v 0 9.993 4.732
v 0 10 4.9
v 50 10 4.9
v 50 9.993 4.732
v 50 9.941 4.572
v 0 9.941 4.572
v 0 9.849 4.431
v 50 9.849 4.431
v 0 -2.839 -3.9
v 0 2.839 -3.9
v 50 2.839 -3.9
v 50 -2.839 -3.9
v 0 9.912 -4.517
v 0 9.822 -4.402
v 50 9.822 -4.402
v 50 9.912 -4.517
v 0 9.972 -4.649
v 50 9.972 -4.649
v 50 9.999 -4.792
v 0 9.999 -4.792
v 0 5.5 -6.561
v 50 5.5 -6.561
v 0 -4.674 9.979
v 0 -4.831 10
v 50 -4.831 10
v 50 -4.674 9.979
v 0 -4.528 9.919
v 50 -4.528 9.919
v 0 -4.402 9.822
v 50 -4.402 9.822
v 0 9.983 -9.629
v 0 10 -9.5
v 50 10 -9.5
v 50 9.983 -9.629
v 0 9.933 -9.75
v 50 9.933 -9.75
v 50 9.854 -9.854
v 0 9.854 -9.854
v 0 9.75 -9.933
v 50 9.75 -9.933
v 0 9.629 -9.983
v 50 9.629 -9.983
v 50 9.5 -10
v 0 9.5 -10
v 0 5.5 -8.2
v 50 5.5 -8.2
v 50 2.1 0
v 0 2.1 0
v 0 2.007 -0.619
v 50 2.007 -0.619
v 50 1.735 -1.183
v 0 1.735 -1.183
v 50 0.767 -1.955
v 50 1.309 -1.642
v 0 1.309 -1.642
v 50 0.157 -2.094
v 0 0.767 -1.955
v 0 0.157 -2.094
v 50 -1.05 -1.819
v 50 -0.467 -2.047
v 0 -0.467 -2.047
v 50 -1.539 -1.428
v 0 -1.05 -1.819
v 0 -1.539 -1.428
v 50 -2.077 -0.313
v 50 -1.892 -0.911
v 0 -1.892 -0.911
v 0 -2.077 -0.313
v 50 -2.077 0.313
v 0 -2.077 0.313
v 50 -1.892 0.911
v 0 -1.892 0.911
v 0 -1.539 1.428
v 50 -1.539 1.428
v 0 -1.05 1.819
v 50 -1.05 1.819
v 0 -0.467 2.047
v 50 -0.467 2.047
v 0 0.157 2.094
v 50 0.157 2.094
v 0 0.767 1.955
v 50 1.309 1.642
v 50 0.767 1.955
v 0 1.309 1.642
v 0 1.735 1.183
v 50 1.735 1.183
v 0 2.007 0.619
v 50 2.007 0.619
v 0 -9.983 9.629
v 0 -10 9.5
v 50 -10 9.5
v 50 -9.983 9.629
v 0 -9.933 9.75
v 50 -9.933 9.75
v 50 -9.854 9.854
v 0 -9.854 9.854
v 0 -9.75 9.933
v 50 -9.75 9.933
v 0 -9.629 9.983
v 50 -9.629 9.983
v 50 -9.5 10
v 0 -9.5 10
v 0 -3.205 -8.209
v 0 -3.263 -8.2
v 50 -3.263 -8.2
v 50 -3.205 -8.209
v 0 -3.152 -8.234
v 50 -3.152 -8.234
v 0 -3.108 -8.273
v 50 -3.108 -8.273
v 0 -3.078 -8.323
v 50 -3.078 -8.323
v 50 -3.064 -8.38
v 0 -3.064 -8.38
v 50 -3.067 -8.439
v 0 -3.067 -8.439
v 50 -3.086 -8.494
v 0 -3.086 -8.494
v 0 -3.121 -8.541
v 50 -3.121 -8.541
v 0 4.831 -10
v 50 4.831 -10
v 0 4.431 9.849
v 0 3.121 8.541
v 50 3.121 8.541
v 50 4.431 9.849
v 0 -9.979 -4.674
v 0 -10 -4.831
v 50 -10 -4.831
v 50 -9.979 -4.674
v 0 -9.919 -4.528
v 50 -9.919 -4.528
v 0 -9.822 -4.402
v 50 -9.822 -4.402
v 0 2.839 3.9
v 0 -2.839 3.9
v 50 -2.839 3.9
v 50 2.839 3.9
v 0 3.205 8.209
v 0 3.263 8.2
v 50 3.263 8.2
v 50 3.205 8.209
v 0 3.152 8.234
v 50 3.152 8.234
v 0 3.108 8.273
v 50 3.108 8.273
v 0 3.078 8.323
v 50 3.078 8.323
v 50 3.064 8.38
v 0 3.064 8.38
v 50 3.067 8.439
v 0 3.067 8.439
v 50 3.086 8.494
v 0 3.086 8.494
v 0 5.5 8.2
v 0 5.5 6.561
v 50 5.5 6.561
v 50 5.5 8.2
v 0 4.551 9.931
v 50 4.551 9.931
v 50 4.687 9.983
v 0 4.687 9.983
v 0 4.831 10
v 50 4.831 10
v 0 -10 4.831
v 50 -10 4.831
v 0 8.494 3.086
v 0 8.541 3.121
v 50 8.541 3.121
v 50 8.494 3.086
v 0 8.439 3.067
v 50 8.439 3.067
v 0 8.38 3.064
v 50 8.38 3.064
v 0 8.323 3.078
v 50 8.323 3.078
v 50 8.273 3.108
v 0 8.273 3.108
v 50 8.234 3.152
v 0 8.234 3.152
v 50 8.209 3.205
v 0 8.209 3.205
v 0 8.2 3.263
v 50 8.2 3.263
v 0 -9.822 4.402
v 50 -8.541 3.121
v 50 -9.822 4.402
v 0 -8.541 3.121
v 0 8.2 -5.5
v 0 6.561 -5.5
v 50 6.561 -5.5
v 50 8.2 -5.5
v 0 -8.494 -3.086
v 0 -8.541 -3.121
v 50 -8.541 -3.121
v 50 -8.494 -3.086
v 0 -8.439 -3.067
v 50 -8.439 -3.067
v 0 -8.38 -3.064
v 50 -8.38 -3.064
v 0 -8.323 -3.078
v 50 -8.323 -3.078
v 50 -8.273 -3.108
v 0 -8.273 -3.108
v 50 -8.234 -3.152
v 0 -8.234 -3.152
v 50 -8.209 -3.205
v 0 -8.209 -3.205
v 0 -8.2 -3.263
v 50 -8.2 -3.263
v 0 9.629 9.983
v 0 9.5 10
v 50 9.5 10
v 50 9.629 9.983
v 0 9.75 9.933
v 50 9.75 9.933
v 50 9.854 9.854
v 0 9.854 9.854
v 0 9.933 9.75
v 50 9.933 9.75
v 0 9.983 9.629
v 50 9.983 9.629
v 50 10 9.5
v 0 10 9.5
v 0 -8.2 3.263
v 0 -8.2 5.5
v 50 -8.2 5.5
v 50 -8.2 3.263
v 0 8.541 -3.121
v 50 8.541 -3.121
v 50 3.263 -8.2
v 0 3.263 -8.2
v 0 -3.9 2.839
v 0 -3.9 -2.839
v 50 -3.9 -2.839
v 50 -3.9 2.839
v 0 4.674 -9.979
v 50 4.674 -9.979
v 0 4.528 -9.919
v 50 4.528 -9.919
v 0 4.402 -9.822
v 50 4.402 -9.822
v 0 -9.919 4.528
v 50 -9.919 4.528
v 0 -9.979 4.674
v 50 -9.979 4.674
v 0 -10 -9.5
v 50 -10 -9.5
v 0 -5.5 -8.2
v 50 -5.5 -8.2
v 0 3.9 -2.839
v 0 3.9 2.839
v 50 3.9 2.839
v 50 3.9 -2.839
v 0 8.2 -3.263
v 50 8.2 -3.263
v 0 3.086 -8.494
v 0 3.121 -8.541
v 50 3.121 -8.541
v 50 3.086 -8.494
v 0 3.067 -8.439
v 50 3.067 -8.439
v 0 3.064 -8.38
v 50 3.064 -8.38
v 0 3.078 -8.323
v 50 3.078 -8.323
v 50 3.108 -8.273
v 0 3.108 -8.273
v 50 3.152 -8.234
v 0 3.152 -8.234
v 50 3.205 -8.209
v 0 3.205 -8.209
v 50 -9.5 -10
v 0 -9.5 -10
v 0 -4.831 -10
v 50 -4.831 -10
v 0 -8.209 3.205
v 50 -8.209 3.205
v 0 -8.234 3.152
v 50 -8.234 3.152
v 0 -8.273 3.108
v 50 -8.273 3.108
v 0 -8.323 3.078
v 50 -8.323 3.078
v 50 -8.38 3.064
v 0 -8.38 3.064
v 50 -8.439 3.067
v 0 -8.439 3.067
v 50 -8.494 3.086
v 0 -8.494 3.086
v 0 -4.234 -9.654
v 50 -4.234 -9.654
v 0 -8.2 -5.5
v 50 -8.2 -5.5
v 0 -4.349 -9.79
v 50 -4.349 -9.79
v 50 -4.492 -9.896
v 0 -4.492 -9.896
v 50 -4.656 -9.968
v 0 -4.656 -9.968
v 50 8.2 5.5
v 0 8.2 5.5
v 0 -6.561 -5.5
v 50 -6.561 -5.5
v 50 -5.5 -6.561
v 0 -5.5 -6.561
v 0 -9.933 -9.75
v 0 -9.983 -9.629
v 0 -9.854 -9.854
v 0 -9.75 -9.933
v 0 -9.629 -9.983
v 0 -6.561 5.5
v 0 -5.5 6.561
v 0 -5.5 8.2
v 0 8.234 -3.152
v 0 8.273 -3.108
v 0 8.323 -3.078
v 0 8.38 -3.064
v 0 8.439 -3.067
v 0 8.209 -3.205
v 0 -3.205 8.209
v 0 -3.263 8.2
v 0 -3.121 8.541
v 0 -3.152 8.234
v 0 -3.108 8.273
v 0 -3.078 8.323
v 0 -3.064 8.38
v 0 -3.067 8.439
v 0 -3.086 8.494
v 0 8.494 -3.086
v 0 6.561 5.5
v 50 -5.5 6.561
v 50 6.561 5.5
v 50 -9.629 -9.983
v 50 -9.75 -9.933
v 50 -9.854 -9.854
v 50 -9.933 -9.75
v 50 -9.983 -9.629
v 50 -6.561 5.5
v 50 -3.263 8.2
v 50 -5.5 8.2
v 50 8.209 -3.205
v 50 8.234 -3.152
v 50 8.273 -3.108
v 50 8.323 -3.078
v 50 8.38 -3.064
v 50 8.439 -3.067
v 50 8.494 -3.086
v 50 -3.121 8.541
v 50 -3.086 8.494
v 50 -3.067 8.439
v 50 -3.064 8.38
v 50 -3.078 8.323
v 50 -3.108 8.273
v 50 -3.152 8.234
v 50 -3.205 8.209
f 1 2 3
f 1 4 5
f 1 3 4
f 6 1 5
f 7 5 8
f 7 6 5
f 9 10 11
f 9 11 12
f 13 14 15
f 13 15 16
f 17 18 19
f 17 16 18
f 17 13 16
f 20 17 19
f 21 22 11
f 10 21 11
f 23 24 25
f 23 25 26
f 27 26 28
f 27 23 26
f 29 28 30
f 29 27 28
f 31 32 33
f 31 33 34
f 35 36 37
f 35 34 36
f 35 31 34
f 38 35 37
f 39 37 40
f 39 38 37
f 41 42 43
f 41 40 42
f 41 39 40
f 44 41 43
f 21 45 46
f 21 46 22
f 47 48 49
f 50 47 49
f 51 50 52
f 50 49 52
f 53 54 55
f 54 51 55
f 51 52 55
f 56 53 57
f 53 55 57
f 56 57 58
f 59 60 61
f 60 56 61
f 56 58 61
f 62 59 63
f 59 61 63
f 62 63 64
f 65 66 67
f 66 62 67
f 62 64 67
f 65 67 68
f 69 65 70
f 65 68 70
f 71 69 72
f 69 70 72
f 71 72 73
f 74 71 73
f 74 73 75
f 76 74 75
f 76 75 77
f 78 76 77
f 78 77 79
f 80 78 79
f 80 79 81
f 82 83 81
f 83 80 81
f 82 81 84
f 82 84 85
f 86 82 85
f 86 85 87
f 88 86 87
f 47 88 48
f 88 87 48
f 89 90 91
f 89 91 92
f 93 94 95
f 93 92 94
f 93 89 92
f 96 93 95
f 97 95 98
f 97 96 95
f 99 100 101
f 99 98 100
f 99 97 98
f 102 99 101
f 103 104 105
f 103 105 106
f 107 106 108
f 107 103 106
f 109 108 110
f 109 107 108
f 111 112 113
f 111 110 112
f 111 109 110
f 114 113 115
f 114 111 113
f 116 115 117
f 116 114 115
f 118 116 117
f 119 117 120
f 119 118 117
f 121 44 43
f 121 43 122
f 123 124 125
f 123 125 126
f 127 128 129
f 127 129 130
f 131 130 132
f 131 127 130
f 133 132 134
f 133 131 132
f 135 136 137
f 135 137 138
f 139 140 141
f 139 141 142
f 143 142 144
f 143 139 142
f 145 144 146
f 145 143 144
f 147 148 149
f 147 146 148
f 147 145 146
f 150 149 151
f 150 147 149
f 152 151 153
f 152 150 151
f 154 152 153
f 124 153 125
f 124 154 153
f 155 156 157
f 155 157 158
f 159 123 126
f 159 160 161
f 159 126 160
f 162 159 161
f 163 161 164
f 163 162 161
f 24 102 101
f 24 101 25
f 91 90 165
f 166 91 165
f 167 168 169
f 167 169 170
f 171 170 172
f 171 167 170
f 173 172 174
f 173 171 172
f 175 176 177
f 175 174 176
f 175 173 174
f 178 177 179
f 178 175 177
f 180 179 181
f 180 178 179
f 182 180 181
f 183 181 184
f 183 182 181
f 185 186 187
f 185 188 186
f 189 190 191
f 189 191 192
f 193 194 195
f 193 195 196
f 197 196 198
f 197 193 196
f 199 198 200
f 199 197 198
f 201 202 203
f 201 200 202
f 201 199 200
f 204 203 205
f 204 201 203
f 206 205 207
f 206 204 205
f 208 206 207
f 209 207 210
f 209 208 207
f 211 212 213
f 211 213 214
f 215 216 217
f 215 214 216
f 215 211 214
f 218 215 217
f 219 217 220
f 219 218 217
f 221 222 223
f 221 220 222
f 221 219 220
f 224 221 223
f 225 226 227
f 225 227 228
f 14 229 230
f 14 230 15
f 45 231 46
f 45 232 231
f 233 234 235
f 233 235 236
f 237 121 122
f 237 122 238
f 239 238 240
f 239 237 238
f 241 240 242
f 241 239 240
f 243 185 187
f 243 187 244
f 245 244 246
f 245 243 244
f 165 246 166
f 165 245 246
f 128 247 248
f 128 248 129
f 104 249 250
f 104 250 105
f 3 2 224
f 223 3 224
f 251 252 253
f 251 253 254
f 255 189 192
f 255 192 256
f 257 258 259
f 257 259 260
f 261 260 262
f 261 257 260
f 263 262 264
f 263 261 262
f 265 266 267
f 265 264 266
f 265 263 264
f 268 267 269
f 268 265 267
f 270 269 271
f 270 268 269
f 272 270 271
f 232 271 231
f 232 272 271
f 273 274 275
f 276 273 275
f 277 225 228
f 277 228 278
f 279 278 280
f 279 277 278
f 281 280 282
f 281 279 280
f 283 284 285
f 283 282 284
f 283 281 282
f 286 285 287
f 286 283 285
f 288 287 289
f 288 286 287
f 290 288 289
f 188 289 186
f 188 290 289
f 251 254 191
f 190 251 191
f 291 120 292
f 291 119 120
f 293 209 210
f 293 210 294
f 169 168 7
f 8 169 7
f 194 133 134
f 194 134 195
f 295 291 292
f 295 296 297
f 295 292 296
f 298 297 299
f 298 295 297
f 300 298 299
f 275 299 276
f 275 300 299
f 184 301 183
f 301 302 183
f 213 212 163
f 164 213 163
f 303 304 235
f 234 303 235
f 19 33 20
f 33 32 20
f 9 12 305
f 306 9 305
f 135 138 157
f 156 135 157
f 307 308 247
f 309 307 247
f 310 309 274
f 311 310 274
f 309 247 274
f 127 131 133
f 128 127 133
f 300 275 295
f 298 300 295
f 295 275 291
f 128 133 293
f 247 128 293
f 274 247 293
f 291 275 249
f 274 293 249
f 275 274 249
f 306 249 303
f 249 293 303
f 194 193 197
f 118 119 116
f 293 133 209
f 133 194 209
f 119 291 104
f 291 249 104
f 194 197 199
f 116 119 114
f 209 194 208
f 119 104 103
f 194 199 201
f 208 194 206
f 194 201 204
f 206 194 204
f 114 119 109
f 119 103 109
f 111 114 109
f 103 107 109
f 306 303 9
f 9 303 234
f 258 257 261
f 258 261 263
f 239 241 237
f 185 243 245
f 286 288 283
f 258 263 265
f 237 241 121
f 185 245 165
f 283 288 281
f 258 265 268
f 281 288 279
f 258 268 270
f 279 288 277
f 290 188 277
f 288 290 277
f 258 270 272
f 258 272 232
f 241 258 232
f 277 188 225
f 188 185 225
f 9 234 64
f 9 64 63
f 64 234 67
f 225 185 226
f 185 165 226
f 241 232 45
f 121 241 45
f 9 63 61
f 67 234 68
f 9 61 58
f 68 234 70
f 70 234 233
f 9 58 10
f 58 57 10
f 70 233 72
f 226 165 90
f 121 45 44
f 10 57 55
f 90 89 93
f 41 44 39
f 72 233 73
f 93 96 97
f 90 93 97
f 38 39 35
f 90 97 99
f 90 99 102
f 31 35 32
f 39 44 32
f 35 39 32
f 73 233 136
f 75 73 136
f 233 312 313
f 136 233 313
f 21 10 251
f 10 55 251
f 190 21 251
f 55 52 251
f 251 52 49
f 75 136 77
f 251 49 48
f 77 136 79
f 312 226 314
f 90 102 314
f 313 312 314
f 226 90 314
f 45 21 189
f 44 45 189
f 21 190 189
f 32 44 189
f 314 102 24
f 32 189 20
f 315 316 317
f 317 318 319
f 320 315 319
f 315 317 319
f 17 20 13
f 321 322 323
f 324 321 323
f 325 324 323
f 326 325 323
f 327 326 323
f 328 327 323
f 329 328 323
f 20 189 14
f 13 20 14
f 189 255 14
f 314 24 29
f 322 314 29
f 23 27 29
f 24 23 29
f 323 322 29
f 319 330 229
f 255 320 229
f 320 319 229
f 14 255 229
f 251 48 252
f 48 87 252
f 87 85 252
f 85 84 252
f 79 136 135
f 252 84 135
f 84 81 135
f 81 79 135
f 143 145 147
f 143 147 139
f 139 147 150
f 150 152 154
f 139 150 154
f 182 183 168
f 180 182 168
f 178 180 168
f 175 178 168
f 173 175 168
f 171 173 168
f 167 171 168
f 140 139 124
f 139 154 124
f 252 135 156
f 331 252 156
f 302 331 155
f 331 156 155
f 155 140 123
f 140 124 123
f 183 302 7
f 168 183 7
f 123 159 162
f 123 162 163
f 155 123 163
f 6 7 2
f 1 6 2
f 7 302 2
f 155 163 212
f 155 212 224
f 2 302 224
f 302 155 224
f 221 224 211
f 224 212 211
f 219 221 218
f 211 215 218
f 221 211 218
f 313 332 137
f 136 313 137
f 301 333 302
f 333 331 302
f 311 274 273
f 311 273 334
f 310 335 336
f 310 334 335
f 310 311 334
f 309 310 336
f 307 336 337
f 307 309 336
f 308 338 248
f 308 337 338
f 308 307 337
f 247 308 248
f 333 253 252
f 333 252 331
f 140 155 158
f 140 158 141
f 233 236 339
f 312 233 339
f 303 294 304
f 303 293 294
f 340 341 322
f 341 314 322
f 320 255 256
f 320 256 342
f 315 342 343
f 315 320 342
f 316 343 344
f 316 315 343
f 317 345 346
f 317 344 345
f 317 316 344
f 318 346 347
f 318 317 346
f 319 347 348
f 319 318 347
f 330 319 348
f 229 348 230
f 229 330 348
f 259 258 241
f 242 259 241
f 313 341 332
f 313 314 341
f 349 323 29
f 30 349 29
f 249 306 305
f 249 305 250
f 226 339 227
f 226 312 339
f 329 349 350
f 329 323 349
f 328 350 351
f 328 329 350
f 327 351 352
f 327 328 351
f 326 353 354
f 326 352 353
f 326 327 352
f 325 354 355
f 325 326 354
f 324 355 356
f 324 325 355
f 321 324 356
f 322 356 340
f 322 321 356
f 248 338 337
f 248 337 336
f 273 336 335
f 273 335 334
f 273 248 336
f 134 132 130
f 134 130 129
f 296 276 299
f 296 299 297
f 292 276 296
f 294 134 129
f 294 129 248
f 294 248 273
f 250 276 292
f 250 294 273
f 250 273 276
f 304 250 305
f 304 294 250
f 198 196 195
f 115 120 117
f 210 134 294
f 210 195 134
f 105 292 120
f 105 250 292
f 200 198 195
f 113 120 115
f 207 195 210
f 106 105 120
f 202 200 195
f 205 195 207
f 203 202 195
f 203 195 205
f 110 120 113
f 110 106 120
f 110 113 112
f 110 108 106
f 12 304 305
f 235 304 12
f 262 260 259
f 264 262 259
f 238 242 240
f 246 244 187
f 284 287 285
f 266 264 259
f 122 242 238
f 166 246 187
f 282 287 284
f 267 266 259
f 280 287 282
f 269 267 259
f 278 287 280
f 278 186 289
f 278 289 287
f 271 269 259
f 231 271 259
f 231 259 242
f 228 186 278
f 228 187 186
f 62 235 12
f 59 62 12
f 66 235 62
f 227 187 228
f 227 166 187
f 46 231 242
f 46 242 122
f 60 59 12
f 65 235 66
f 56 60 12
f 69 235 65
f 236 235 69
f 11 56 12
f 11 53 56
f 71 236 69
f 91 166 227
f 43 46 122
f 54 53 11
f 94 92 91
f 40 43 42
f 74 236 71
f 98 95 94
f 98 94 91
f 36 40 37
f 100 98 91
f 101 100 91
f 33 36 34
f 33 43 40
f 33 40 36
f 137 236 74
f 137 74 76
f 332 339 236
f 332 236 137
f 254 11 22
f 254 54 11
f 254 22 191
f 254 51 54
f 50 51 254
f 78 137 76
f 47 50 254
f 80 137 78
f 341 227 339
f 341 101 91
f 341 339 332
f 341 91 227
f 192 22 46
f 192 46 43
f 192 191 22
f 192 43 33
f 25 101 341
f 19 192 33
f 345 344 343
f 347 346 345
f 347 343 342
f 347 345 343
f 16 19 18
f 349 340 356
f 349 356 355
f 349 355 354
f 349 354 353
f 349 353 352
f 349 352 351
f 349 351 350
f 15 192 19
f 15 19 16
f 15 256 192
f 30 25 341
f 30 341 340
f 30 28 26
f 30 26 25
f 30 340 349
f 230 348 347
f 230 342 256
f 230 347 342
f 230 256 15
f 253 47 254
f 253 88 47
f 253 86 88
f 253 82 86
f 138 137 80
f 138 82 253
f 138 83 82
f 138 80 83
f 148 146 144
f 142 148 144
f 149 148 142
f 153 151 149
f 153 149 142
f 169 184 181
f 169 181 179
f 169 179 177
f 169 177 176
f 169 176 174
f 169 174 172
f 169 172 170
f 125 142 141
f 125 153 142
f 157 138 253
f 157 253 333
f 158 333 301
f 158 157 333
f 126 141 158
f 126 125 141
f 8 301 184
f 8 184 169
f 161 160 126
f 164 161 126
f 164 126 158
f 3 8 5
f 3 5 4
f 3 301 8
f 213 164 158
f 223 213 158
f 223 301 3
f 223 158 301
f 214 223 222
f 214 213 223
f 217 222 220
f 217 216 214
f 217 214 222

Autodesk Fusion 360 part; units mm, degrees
sketch "Sketch1" plane through (0, 0, 0) normal (1, 0, 0) x (0, 1, 0)
  line L0 (4.6363, -9.9678) -> (4.6743, -9.9793) construction
  line L1 (-9.9374, 4.563) -> (-9.9187, 4.5279) construction
  line L2 (8.5, -10) -> (9.5, -10) construction
  line L3 (10, -9.5) -> (10, -8.5) construction
  line L4 (-9.8746, 4.4619) -> (-9.8494, 4.4312) construction
  line L5 (-9.9187, 4.5279) -> (-9.8977, 4.4942) construction
  line L6 (9.9987, -4.7917) -> (9.9948, -4.7522) construction
  line L7 (9.8977, -4.4942) -> (9.8746, -4.4619) construction
  arc A0 (-8.5414, 3.1214) -> (-8.2, 3.2628) centre (-8.4, 3.2628) ccw construction
  line L8 (10, -4.9) -> (9.9987, -4.7917) construction
  line L9 (-3.9, 2.8393) -> (-3.9, 0.1999) construction
  line L10 (-9.8977, 4.4942) -> (-9.8746, 4.4619) construction
  line L11 (-10, 4.8314) -> (-9.9987, 4.7917) construction
  line L12 (-9.8494, 4.4312) -> (-9.8222, 4.4022) construction
  line L13 (8.2, -5.5) -> (6.5607, -5.5) construction
  line L14 (-6.5607, 5.5) -> (-3.9, 2.8393) construction
  line L15 (5.5, -6.5607) -> (5.5, -8.2) construction
  line L16 (-3.9, 0.1999) -> (-3.7001, 0) construction
  line L17 (6.5607, -5.5) -> (3.9, -2.8393) construction
  line L18 (9.9987, 4.7917) -> (10, 4.9) construction
  line L19 (8.2, -3.2628) -> (8.2, -5.5) construction
  line L20 (-4.4942, 9.8977) -> (-4.5279, 9.9187) construction
  line L21 (9.9948, 4.7522) -> (9.9987, 4.7917) construction
  line L22 (9.8746, -4.4619) -> (9.8494, -4.4312) construction
  line L23 (9.9374, -4.563) -> (9.9187, -4.5279) construction
  line L24 (10, 8.5) -> (10, 9.5) construction
  line L25 (4.4312, -9.8494) -> (4.4619, -9.8746) construction
  line L26 (-8.2, 3.2628) -> (-8.2, 5.5) construction
  line L27 (4.4619, -9.8746) -> (4.4942, -9.8977) construction
  line L28 (-9.9883, 4.713) -> (-9.9793, 4.6743) construction
  line L29 (9.9883, 4.713) -> (9.9948, 4.7522) construction
  line L30 (-4.4312, 9.8494) -> (-4.4619, 9.8746) construction
  line L31 (10, 4.9) -> (10, 8.5) construction
  arc A1 (9.5, -10) -> (10, -9.5) centre (9.5, -9.5) ccw construction
  line L32 (9.9678, -4.6363) -> (9.9538, -4.5991) construction
  arc A2 (10, 9.5) -> (9.5, 10) centre (9.5, 9.5) ccw construction
  line L33 (4.5991, -9.9538) -> (4.6363, -9.9678) construction
  line L34 (-9.9538, 4.5991) -> (-9.9374, 4.563) construction
  line L35 (-9.9793, 4.6743) -> (-9.9678, 4.6363) construction
  line L36 (4.563, -9.9374) -> (4.5991, -9.9538) construction
  line L37 (1.1358, -3.9) -> (1.1358, -10) construction
  line L38 (-0.2048, -3.9) -> (0, -3.6952) construction
  line L39 (8.5414, 3.1214) -> (9.8222, 4.4022) construction
  line L40 (2.8393, 3.9) -> (0.207, 3.9) construction
  line L41 (0.207, 3.9) -> (0, 3.6952) construction
  line L42 (3.9, -0.1999) -> (3.7001, 0) construction
  line L43 (3.9, -2.8393) -> (3.9, -0.1999) construction
  line L44 (-3.9, -0.1999) -> (-3.9, -2.8393) construction
  line L45 (3.9, 0.1999) -> (3.9, 2.8393) construction
  line L46 (2.8393, 3.9) -> (0.207, 3.9) construction
  line L47 (0, 3.6952) -> (-0.2048, 3.9) construction
  line L48 (3.9, 2.8393) -> (6.5607, 5.5) construction
  line L49 (3.7001, 0) -> (3.9, 0.1999) construction
  line L50 (3.9, 0.1999) -> (3.9, 2.8393) construction
  arc A3 (-3.1214, -8.5414) -> (-3.2628, -8.2) centre (-3.2628, -8.4) ccw construction
  line L51 (0, -3.6952) -> (0.2048, -3.9) construction
  line L52 (-2.8393, -3.9) -> (-0.2048, -3.9) construction
  line L53 (3.9, -0.1999) -> (3.7001, 0) construction
  circle A4 centre (0, 0) radius 2.1 construction
  line L54 (3.7001, 0) -> (3.9, 0.1999) construction
  arc A5 (8.2, 3.2628) -> (8.5414, 3.1214) centre (8.4, 3.2628) ccw construction
  circle A6 centre (0, 0) radius 2.1 construction
  line L55 (5.5, 8.2) -> (5.5, 6.5607) construction
  line L56 (-4.6363, -9.9678) -> (-4.5991, -9.9538) construction
  line L57 (9.9883, 4.713) -> (9.9948, 4.7522) construction
  line L58 (3.2628, 8.2) -> (5.5, 8.2) construction
  line L59 (9.9538, 4.5991) -> (9.9678, 4.6363) construction
  arc A7 (8.2, 3.2628) -> (8.5414, 3.1214) centre (8.4, 3.2628) ccw construction
  line L60 (4.5991, 9.9538) -> (4.563, 9.9374) construction
  line L61 (-9.9538, -4.5991) -> (-9.9678, -4.6363) construction
  line L62 (-9.8977, -4.4942) -> (-9.9187, -4.5279) construction
  line L63 (-4.5279, -9.9187) -> (-4.4942, -9.8977) construction
  line L64 (0, 3.6952) -> (-0.2048, 3.9) construction
  arc A8 (3.1214, 8.5414) -> (3.2628, 8.2) centre (3.2628, 8.4) ccw construction
  line L65 (-9.8494, -4.4312) -> (-9.8746, -4.4619) construction
  line L66 (4.4942, 9.8977) -> (4.4619, 9.8746) construction
  line L67 (4.713, 9.9883) -> (4.6743, 9.9793) construction
  line L68 (-8.5, -10) -> (-4.8314, -10) construction
  line L69 (-9.5, -10) -> (-8.5, -10) construction
  line L70 (9.8222, 4.4022) -> (9.8494, 4.4312) construction
  line L71 (4.8314, 10) -> (4.7917, 9.9987) construction
  line L72 (-9.9948, -4.7522) -> (-9.9987, -4.7917) construction
  line L73 (4.6743, 9.9793) -> (4.6363, 9.9678) construction
  line L74 (5.5, 6.5607) -> (2.8393, 3.9) construction
  line L75 (4.4022, 9.8222) -> (3.1214, 8.5414) construction
  line L76 (-4.5991, -9.9538) -> (-4.563, -9.9374) construction
  line L77 (9.5, 10) -> (4.8314, 10) construction
  line L78 (0.207, 3.9) -> (0, 3.6952) construction
  line L79 (4.6363, 9.9678) -> (4.5991, 9.9538) construction
  line L80 (-9.9883, -4.713) -> (-9.9948, -4.7522) construction
  line L81 (4.7522, 9.9948) -> (4.713, 9.9883) construction
  line L82 (-4.4312, -9.8494) -> (-4.4022, -9.8222) construction
  line L83 (9.8746, 4.4619) -> (9.8977, 4.4942) construction
  line L84 (-8.2, -5.5) -> (-8.2, -3.2628) construction
  line L85 (10, 8.5) -> (10, 9.5) construction
  line L86 (3.2628, 8.2) -> (5.5, 8.2) construction
  arc A9 (3.1214, 8.5414) -> (3.2628, 8.2) centre (3.2628, 8.4) ccw construction
  arc A10 (10, 9.5) -> (9.5, 10) centre (9.5, 9.5) ccw construction
  line L87 (4.4619, 9.8746) -> (4.4312, 9.8494) construction
  line L88 (4.5279, 9.9187) -> (4.4942, 9.8977) construction
  line L89 (-4.6743, -9.9793) -> (-4.6363, -9.9678) construction
  line L90 (-4.7917, -9.9987) -> (-4.7522, -9.9948) construction
  line L91 (-9.9678, -4.6363) -> (-9.9793, -4.6743) construction
  line L92 (9.9793, 4.6743) -> (9.9883, 4.713) construction
  line L93 (-4.8314, -10) -> (-4.7917, -9.9987) construction
  line L94 (-9.9987, -4.7917) -> (-10, -4.8314) construction
  line L95 (5.5, 8.2) -> (5.5, 6.5607) construction
  line L96 (9.8977, 4.4942) -> (9.9187, 4.5279) construction
  arc A11 (-8.2, -3.2628) -> (-8.5414, -3.1214) centre (-8.4, -3.2628) ccw construction
  line L97 (-8.5414, -3.1214) -> (-9.8222, -4.4022) construction
  line L98 (4.563, 9.9374) -> (4.5279, 9.9187) construction
  line L99 (9.9374, 4.563) -> (9.9538, 4.5991) construction
  line L100 (9.8494, 4.4312) -> (9.8746, 4.4619) construction
  line L101 (-4.4942, -9.8977) -> (-4.4619, -9.8746) construction
  line L102 (-9.9187, -4.5279) -> (-9.9374, -4.563) construction
  arc A12 (-10, -9.5) -> (-9.5, -10) centre (-9.5, -9.5) ccw construction
  line L103 (-4.563, -9.9374) -> (-4.5279, -9.9187) construction
  line L104 (4.4022, 9.8222) -> (3.1214, 8.5414) construction
  line L105 (-6.5607, -5.5) -> (-8.2, -5.5) construction
  line L106 (10, 4.9) -> (10, 8.5) construction
  line L107 (3.9, 2.8393) -> (6.5607, 5.5) construction
  line L108 (4.4312, 9.8494) -> (4.4022, 9.8222) construction
  line L109 (9.9678, 4.6363) -> (9.9793, 4.6743) construction
  line L110 (-4.4619, -9.8746) -> (-4.4312, -9.8494) construction
  line L111 (-4.7522, -9.9948) -> (-4.713, -9.9883) construction
  line L112 (-10, -4.8314) -> (-10, -9.5) construction
  line L113 (4.5279, 9.9187) -> (4.4942, 9.8977) construction
  line L114 (9.9948, 4.7522) -> (9.9987, 4.7917) construction
  line L115 (4.7917, 9.9987) -> (4.7522, 9.9948) construction
  line L116 (4.563, 9.9374) -> (4.5279, 9.9187) construction
  line L117 (5.5, 6.5607) -> (2.8393, 3.9) construction
  line L118 (4.4619, 9.8746) -> (4.4312, 9.8494) construction
  line L119 (4.4942, 9.8977) -> (4.4619, 9.8746) construction
  line L120 (4.5991, 9.9538) -> (4.563, 9.9374) construction
  line L121 (-5.5, -8.2) -> (-5.5, -6.5607) construction
  line L122 (9.9987, 4.7917) -> (10, 4.9) construction
  line L123 (8.2, 5.5) -> (8.2, 3.2628) construction
  line L124 (4.4312, 9.8494) -> (4.4022, 9.8222) construction
  line L125 (-9.8746, -4.4619) -> (-9.8977, -4.4942) construction
  line L126 (-4.713, -9.9883) -> (-4.6743, -9.9793) construction
  line L127 (9.9187, 4.5279) -> (9.9374, 4.563) construction
  line L128 (6.5607, 5.5) -> (8.2, 5.5) construction
  line L129 (-9.9793, -4.6743) -> (-9.9883, -4.713) construction
  line L130 (-5.5, -6.5607) -> (-2.8393, -3.9) construction
  line L131 (8.5414, 3.1214) -> (9.8222, 4.4022) construction
  line L132 (-3.9, -2.8393) -> (-6.5607, -5.5) construction
  line L133 (4.713, 9.9883) -> (4.6743, 9.9793) construction
  line L134 (4.7917, 9.9987) -> (4.7522, 9.9948) construction
  line L135 (-4.4022, -9.8222) -> (-3.1214, -8.5414) construction
  line L136 (-9.9987, 4.7917) -> (-9.9948, 4.7522) construction
  line L137 (4.6363, 9.9678) -> (4.5991, 9.9538) construction
  line L138 (4.8314, 10) -> (4.7917, 9.9987) construction
  line L139 (-9.9948, 4.7522) -> (-9.9883, 4.713) construction
  line L140 (4.6743, 9.9793) -> (4.6363, 9.9678) construction
  line L141 (-8.2, 5.5) -> (-6.5607, 5.5) construction
  line L142 (-3.7001, 0) -> (-3.9, -0.1999) construction
  line L143 (-9.9678, 4.6363) -> (-9.9538, 4.5991) construction
  line L144 (-9.8222, 4.4022) -> (-8.5414, 3.1214) construction
  line L145 (-9.9374, -4.563) -> (-9.9538, -4.5991) construction
  line L146 (-9.8222, -4.4022) -> (-9.8494, -4.4312) construction
  line L147 (4.7522, 9.9948) -> (4.713, 9.9883) construction
  line L148 (-3.2628, -8.2) -> (-5.5, -8.2) construction
  line L149 (4.4619, -9.8746) -> (4.4942, -9.8977) construction
  line L150 (-9.9948, 4.7522) -> (-9.9883, 4.713) construction
  line L151 (4.5279, -9.9187) -> (4.563, -9.9374) construction
  line L152 (-9.9793, 4.6743) -> (-9.9678, 4.6363) construction
  line L153 (-9.9883, 4.713) -> (-9.9793, 4.6743) construction
  line L154 (4.4312, -9.8494) -> (4.4619, -9.8746) construction
  line L155 (-9.8977, 4.4942) -> (-9.8746, 4.4619) construction
  line L156 (4.7522, -9.9948) -> (4.7917, -9.9987) construction
  line L157 (4.713, -9.9883) -> (4.7522, -9.9948) construction
  line L158 (4.4942, -9.8977) -> (4.5279, -9.9187) construction
  line L159 (4.5991, -9.9538) -> (4.6363, -9.9678) construction
  line L160 (-9.9187, 4.5279) -> (-9.8977, 4.4942) construction
  line L161 (4.6743, -9.9793) -> (4.713, -9.9883) construction
  line L162 (4.563, -9.9374) -> (4.5991, -9.9538) construction
  line L163 (-9.9678, 4.6363) -> (-9.9538, 4.5991) construction
  line L164 (-9.9538, 4.5991) -> (-9.9374, 4.563) construction
  line L165 (-9.9374, 4.563) -> (-9.9187, 4.5279) construction
  line L166 (-9.8746, 4.4619) -> (-9.8494, 4.4312) construction
  line L167 (4.6363, -9.9678) -> (4.6743, -9.9793) construction
  line L168 (-4.7522, 9.9948) -> (-4.7917, 9.9987) construction
  line L169 (9.8494, 4.4312) -> (9.8746, 4.4619) construction
  line L170 (4.5279, -9.9187) -> (4.563, -9.9374) construction
  line L171 (-4.5991, 9.9538) -> (-4.6363, 9.9678) construction
  line L172 (9.9538, -4.5991) -> (9.9374, -4.563) construction
  line L173 (-10, 9.5) -> (-10, 8.5) construction
  line L174 (9.8977, 4.4942) -> (9.9187, 4.5279) construction
  line L175 (4.8314, -10) -> (8.5, -10) construction
  line L176 (9.8746, 4.4619) -> (9.8977, 4.4942) construction
  line L177 (4.7917, -9.9987) -> (4.8314, -10) construction
  line L178 (-5.5, 8.2) -> (-3.2628, 8.2) construction
  line L179 (9.9793, 4.6743) -> (9.9883, 4.713) construction
  line L180 (4.713, -9.9883) -> (4.7522, -9.9948) construction
  arc A13 (-9.5, 10) -> (-10, 9.5) centre (-9.5, 9.5) ccw construction
  line L181 (2.8393, -3.9) -> (5.5, -6.5607) construction
  line L182 (9.8494, -4.4312) -> (9.8222, -4.4022) construction
  line L183 (9.9187, -4.5279) -> (9.8977, -4.4942) construction
  line L184 (10, -8.5) -> (10, -4.9) construction
  line L185 (-4.563, 9.9374) -> (-4.5991, 9.9538) construction
  line L186 (-4.6743, 9.9793) -> (-4.713, 9.9883) construction
  line L187 (-5.5, 6.5607) -> (-5.5, 8.2) construction
  line L188 (-4.8314, 10) -> (-8.5, 10) construction
  line L189 (9.9374, 4.563) -> (9.9538, 4.5991) construction
  line L190 (-8.5, 10) -> (-9.5, 10) construction
  line L191 (-4.7917, 9.9987) -> (-4.8314, 10) construction
  line L192 (-4.5279, 9.9187) -> (-4.563, 9.9374) construction
  line L193 (9.9538, 4.5991) -> (9.9678, 4.6363) construction
  line L194 (-4.6363, 9.9678) -> (-4.6743, 9.9793) construction
  line L195 (4.7522, -9.9948) -> (4.7917, -9.9987) construction
  line L196 (-3.1214, 8.5414) -> (-4.4022, 9.8222) construction
  line L197 (5.5, -8.2) -> (3.2628, -8.2) construction
  line L198 (9.9793, -4.6743) -> (9.9678, -4.6363) construction
  line L199 (4.6743, -9.9793) -> (4.713, -9.9883) construction
  line L200 (9.9187, 4.5279) -> (9.9374, 4.563) construction
  line L201 (9.9948, -4.7522) -> (9.9883, -4.713) construction
  line L202 (9.8222, -4.4022) -> (8.5414, -3.1214) construction
  line L203 (-4.713, 9.9883) -> (-4.7522, 9.9948) construction
  line L204 (9.9678, 4.6363) -> (9.9793, 4.6743) construction
  line L205 (9.9883, -4.713) -> (9.9793, -4.6743) construction
  arc A14 (-3.2628, 8.2) -> (-3.1214, 8.5414) centre (-3.2628, 8.4) ccw construction
  line L206 (4.4022, -9.8222) -> (4.4312, -9.8494) construction
  arc A15 (8.5414, -3.1214) -> (8.2, -3.2628) centre (8.4, -3.2628) ccw construction
  arc A16 (3.2628, -8.2) -> (3.1214, -8.5414) centre (3.2628, -8.4) ccw construction
  line L207 (9.8222, 4.4022) -> (9.8494, 4.4312) construction
  line L208 (-3.9, 0.1999) -> (-3.7001, 0) construction
  line L209 (-0.2048, 3.9) -> (-2.8393, 3.9) construction
  line L210 (8.2, 5.5) -> (8.2, 3.2628) construction
  line L211 (6.6657, -10) -> (-6.6657, -10) construction
  line L212 (-3.7001, 0) -> (-3.9, -0.1999) construction
  line L213 (4.4942, -9.8977) -> (4.5279, -9.9187) construction
  line L214 (0.2048, -3.9) -> (2.8393, -3.9) construction
  line L215 (-10, 8.5) -> (-10, 4.8314) construction
  line L216 (2.8393, -3.9) -> (5.5, -6.5607) construction
  line L217 (-2.8393, 3.9) -> (-5.5, 6.5607) construction
  line L218 (-0.2048, -3.9) -> (0, -3.6952) construction
  line L219 (5.5, -6.5607) -> (5.5, -8.2) construction
  line L220 (3.9, -2.8393) -> (3.9, -0.1999) construction
  line L221 (-4.4022, 9.8222) -> (-4.4312, 9.8494) construction
  line L222 (-0.2048, 3.9) -> (-2.8393, 3.9) construction
  line L223 (-4.4619, 9.8746) -> (-4.4942, 9.8977) construction
  line L224 (0.2048, -3.9) -> (2.8393, -3.9) construction
  line L225 (3.1214, -8.5414) -> (4.4022, -9.8222) construction
  line L226 (9.5, 10) -> (4.8314, 10) construction
  line L227 (0, -3.6952) -> (0.2048, -3.9) construction
  line L228 (6.5607, 5.5) -> (8.2, 5.5) construction
  line L229 (-2.8393, 3.9) -> (-5.5, 6.5607) construction
  line L230 (-3.9, 2.8393) -> (-3.9, 0.1999) construction
  line L231 (-6.5607, 5.5) -> (-3.9, 2.8393) construction
  arc A17 (-8.5414, 3.1214) -> (-8.2, 3.2628) centre (-8.4, 3.2628) ccw construction
  arc A18 (3.2628, -8.2) -> (3.1214, -8.5414) centre (3.2628, -8.4) ccw construction
  line L232 (-9.8222, 4.4022) -> (-8.5414, 3.1214) construction
  line L233 (-9.8494, 4.4312) -> (-9.8222, 4.4022) construction
  line L234 (-8.2, 5.5) -> (-6.5607, 5.5) construction
  line L235 (4.7917, -9.9987) -> (4.8314, -10) construction
  line L236 (8.5, -10) -> (9.5, -10) construction
  line L237 (4.8314, -10) -> (8.5, -10) construction
  line L238 (-9.5, -10) -> (-8.5, -10) construction
  line L239 (-5.5, -8.2) -> (-5.5, -6.5607) construction
  line L240 (-4.4619, -9.8746) -> (-4.4312, -9.8494) construction
  line L241 (-4.6363, -9.9678) -> (-4.5991, -9.9538) construction
  line L242 (-4.563, -9.9374) -> (-4.5279, -9.9187) construction
  line L243 (-4.7522, -9.9948) -> (-4.713, -9.9883) construction
  line L244 (-8.2, -5.5) -> (-8.2, -3.2628) construction
  arc A19 (-10, -9.5) -> (-9.5, -10) centre (-9.5, -9.5) ccw construction
  line L245 (-4.6743, -9.9793) -> (-4.6363, -9.9678) construction
  line L246 (-4.713, -9.9883) -> (-4.6743, -9.9793) construction
  line L247 (-4.5279, -9.9187) -> (-4.4942, -9.8977) construction
  line L248 (-4.5991, -9.9538) -> (-4.563, -9.9374) construction
  line L249 (-5.5, 8.2) -> (-3.2628, 8.2) construction
  line L250 (6.5607, -5.5) -> (3.9, -2.8393) construction
  line L251 (-3.2628, -8.2) -> (-5.5, -8.2) construction
  line L252 (-4.8314, -10) -> (-4.7917, -9.9987) construction
  line L253 (-4.8314, 10) -> (-8.5, 10) construction
  line L254 (8.2, -3.2628) -> (8.2, -5.5) construction
  line L255 (-4.4312, -9.8494) -> (-4.4022, -9.8222) construction
  line L256 (10, -8.5) -> (10, -4.9) construction
  line L257 (-4.4942, -9.8977) -> (-4.4619, -9.8746) construction
  line L258 (-10, -4.8314) -> (-10, -9.5) construction
  line L259 (-8.5, -10) -> (-4.8314, -10) construction
  line L260 (-4.4022, -9.8222) -> (-3.1214, -8.5414) construction
  arc A20 (-3.1214, -8.5414) -> (-3.2628, -8.2) centre (-3.2628, -8.4) ccw construction
  line L261 (-4.7917, -9.9987) -> (-4.7522, -9.9948) construction
  arc A21 (8.5414, -3.1214) -> (8.2, -3.2628) centre (8.4, -3.2628) ccw construction
  line L262 (-6.5607, -5.5) -> (-8.2, -5.5) construction
  line L263 (-3.9, -2.8393) -> (-6.5607, -5.5) construction
  line L264 (-8.2, 3.2628) -> (-8.2, 5.5) construction
  line L265 (4.4022, -9.8222) -> (4.4312, -9.8494) construction
  line L266 (-10, 4.8314) -> (-9.9987, 4.7917) construction
  line L267 (5.5, -8.2) -> (3.2628, -8.2) construction
  line L268 (-10, 8.5) -> (-10, 4.8314) construction
  line L269 (-9.9987, 4.7917) -> (-9.9948, 4.7522) construction
  line L270 (-2.8393, -3.9) -> (-0.2048, -3.9) construction
  line L271 (3.1214, -8.5414) -> (4.4022, -9.8222) construction
  line L272 (-5.5, -6.5607) -> (-2.8393, -3.9) construction
  arc A22 (-3.2628, 8.2) -> (-3.1214, 8.5414) centre (-3.2628, 8.4) ccw construction
  line L273 (-3.9, -0.1999) -> (-3.9, -2.8393) construction
  line L274 (-4.7917, 9.9987) -> (-4.8314, 10) construction
  line L275 (9.8222, -4.4022) -> (8.5414, -3.1214) construction
  line L276 (-9.9678, -4.6363) -> (-9.9793, -4.6743) construction
  line L277 (9.9793, -4.6743) -> (9.9678, -4.6363) construction
  line L278 (-4.6363, 9.9678) -> (-4.6743, 9.9793) construction
  line L279 (-4.7522, 9.9948) -> (-4.7917, 9.9987) construction
  line L280 (-9.9374, -4.563) -> (-9.9538, -4.5991) construction
  line L281 (9.9987, -4.7917) -> (9.9948, -4.7522) construction
  line L282 (-4.5991, 9.9538) -> (-4.6363, 9.9678) construction
  line L283 (-4.713, 9.9883) -> (-4.7522, 9.9948) construction
  line L284 (-4.6743, 9.9793) -> (-4.713, 9.9883) construction
  line L285 (-9.9948, -4.7522) -> (-9.9987, -4.7917) construction
  line L286 (-9.9883, -4.713) -> (-9.9948, -4.7522) construction
  line L287 (-4.4619, 9.8746) -> (-4.4942, 9.8977) construction
  line L288 (9.8977, -4.4942) -> (9.8746, -4.4619) construction
  line L289 (9.9187, -4.5279) -> (9.8977, -4.4942) construction
  line L290 (-9.9987, -4.7917) -> (-10, -4.8314) construction
  line L291 (-4.4942, 9.8977) -> (-4.5279, 9.9187) construction
  line L292 (-4.5279, 9.9187) -> (-4.563, 9.9374) construction
  line L293 (-4.4312, 9.8494) -> (-4.4619, 9.8746) construction
  line L294 (-4.563, 9.9374) -> (-4.5991, 9.9538) construction
  line L295 (-4.4022, 9.8222) -> (-4.4312, 9.8494) construction
  line L296 (9.9374, -4.563) -> (9.9187, -4.5279) construction
  arc A23 (-8.2, -3.2628) -> (-8.5414, -3.1214) centre (-8.4, -3.2628) ccw construction
  line L297 (9.9538, -4.5991) -> (9.9374, -4.563) construction
  line L298 (9.8494, -4.4312) -> (9.8222, -4.4022) construction
  line L299 (9.8746, -4.4619) -> (9.8494, -4.4312) construction
  line L300 (9.9678, -4.6363) -> (9.9538, -4.5991) construction
  line L301 (-9.9793, -4.6743) -> (-9.9883, -4.713) construction
  line L302 (-9.9538, -4.5991) -> (-9.9678, -4.6363) construction
  line L303 (-3.1214, 8.5414) -> (-4.4022, 9.8222) construction
  line L304 (9.9883, -4.713) -> (9.9793, -4.6743) construction
  line L305 (9.9948, -4.7522) -> (9.9883, -4.713) construction
  line L306 (-9.8222, -4.4022) -> (-9.8494, -4.4312) construction
  line L307 (8.2, -5.5) -> (6.5607, -5.5) construction
  arc A24 (9.5, -10) -> (10, -9.5) centre (9.5, -9.5) ccw construction
  line L308 (-8.5414, -3.1214) -> (-9.8222, -4.4022) construction
  line L309 (10, -9.5) -> (10, -8.5) construction
  line L310 (10, -4.9) -> (9.9987, -4.7917) construction
  line L311 (-9.8977, -4.4942) -> (-9.9187, -4.5279) construction
  arc A25 (-9.5, 10) -> (-10, 9.5) centre (-9.5, 9.5) ccw construction
  line L312 (-9.8494, -4.4312) -> (-9.8746, -4.4619) construction
  line L313 (-9.9187, -4.5279) -> (-9.9374, -4.563) construction
  line L314 (-8.5, 10) -> (-9.5, 10) construction
  line L315 (-10, 9.5) -> (-10, 8.5) construction
  line L316 (-5.5, 6.5607) -> (-5.5, 8.2) construction
  line L317 (-9.8746, -4.4619) -> (-9.8977, -4.4942) construction
  line L318 (3.9, 2.8393) -> (3.9, -2.8393)
  line L319 (3.9, -2.8393) -> (6.5607, -5.5)
  line L320 (6.5607, -5.5) -> (8.2, -5.5)
  line L321 (8.2, -5.5) -> (8.2, -3.2628)
  line L322 (8.5414, -3.1214) -> (9.8222, -4.4022)
  arc A26 (8.5414, -3.1214) -> (8.2, -3.2628) centre (8.4, -3.2628) ccw
  line L323 (10, -9.5) -> (9.9987, -4.7917)
  line L324 (9.5, -10) -> (4.8314, -10)
  line L325 (3.1214, -8.5414) -> (4.4022, -9.8222)
  line L326 (3.2628, -8.2) -> (5.5, -8.2)
  line L327 (5.5, -8.2) -> (5.5, -6.5607)
  arc A27 (9.5, -10) -> (10, -9.5) centre (9.5, -9.5) ccw
  arc A28 (9.9987, -4.7917) -> (9.8222, -4.4022) centre (9.3929, -4.8314) ccw
  line L328 (5.5, -6.5607) -> (2.8393, -3.9)
  line L329 (2.8393, -3.9) -> (-2.8393, -3.9)
  line L330 (-2.8393, -3.9) -> (-5.5, -6.5607)
  line L331 (-5.5, -6.5607) -> (-5.5, -8.2)
  line L332 (-5.5, -8.2) -> (-3.2628, -8.2)
  line L333 (-3.1214, -8.5414) -> (-4.2336, -9.6536)
  line L334 (-9.5, -10) -> (-4.8314, -10)
  line L335 (-10, -9.5) -> (-10, -4.8314)
  line L336 (-9.8222, -4.4022) -> (-8.5414, -3.1214)
  line L337 (-8.2, -3.2628) -> (-8.2, -5.5)
  line L338 (-8.2, -5.5) -> (-6.5607, -5.5)
  line L339 (-6.5607, -5.5) -> (-3.9, -2.8393)
  line L340 (-3.9, -2.8393) -> (-3.9, 2.8393)
  line L341 (-3.9, 2.8393) -> (-6.5607, 5.5)
  line L342 (-6.5607, 5.5) -> (-8.2, 5.5)
  line L343 (-8.2, 5.5) -> (-8.2, 3.2628)
  line L344 (-8.5414, 3.1214) -> (-9.8222, 4.4022)
  line L345 (-10, 9.5) -> (-10, 4.8314)
  line L346 (-9.5, 10) -> (-4.8314, 10)
  line L347 (-5.5, 8.2) -> (-3.2628, 8.2)
  line L348 (-3.1214, 8.5414) -> (-4.4022, 9.8222)
  line L349 (-5.5, 8.2) -> (-5.5, 6.5607)
  line L350 (-5.5, 6.5607) -> (-2.8393, 3.9)
  line L351 (-2.8393, 3.9) -> (2.8393, 3.9)
  line L352 (2.8393, 3.9) -> (5.5, 6.5607)
  line L353 (5.5, 6.5607) -> (5.5, 8.2)
  line L354 (5.5, 8.2) -> (3.2628, 8.2)
  line L355 (3.1214, 8.5414) -> (4.4312, 9.8494)
  line L356 (3.9, 2.8393) -> (6.5607, 5.5)
  line L357 (6.5607, 5.5) -> (8.2, 5.5)
  line L358 (8.2, 5.5) -> (8.2, 3.2628)
  line L359 (8.5414, 3.1214) -> (9.8494, 4.4312)
  line L360 (10, 4.9) -> (10, 9.5)
  line L361 (9.5, 10) -> (4.8314, 10)
  arc A29 (8.2, 3.2628) -> (8.5414, 3.1214) centre (8.4, 3.2628) ccw
  arc A30 (9.8494, 4.4312) -> (10, 4.9) centre (9.3734, 4.8428) ccw
  arc A31 (10, 9.5) -> (9.5, 10) centre (9.5, 9.5) ccw
  arc A32 (4.8314, 10) -> (4.4312, 9.8494) centre (4.8314, 9.3929) ccw
  arc A33 (3.1214, 8.5414) -> (3.2628, 8.2) centre (3.2628, 8.4) ccw
  arc A34 (-3.2628, 8.2) -> (-3.1214, 8.5414) centre (-3.2628, 8.4) ccw
  arc A35 (-4.4022, 9.8222) -> (-4.8314, 10) centre (-4.8314, 9.3929) ccw
  arc A36 (-9.5, 10) -> (-10, 9.5) centre (-9.5, 9.5) ccw
  arc A37 (-10, 4.8314) -> (-9.8222, 4.4022) centre (-9.3929, 4.8314) ccw
  arc A38 (-8.5414, 3.1214) -> (-8.2, 3.2628) centre (-8.4, 3.2628) ccw
  arc A39 (-8.2, -3.2628) -> (-8.5414, -3.1214) centre (-8.4, -3.2628) ccw
  arc A40 (-9.8222, -4.4022) -> (-10, -4.8314) centre (-9.3929, -4.8314) ccw
  arc A41 (-10, -9.5) -> (-9.5, -10) centre (-9.5, -9.5) ccw
  arc A42 (-4.8314, -10) -> (-4.2336, -9.6536) centre (-4.8837, -9.2207) ccw
  arc A43 (-3.1214, -8.5414) -> (-3.2628, -8.2) centre (-3.2628, -8.4) ccw
  arc A44 (3.2628, -8.2) -> (3.1214, -8.5414) centre (3.2628, -8.4) ccw
  arc A45 (4.4022, -9.8222) -> (4.8314, -10) centre (4.8314, -9.3929) ccw
  circle A46 centre (0, 0) radius 2.1
extrude "Extrude1" add sketch "Sketch1" along normal blind 50
sketch "Sketch2" plane through (0, 0, 0) normal (-1, 0, 0) x (0, -1, 0)
  circle A0 centre (0, 0) radius 2.1
  arc A1 (-3.1214, -8.5414) -> (-3.2628, -8.2) centre (-3.2628, -8.4) ccw
  line L0 (-3.2628, -8.2) -> (-5.5, -8.2)
  line L1 (-5.5, -8.2) -> (-5.5, -6.5607)
  line L2 (-5.5, -6.5607) -> (-2.8393, -3.9)
  line L3 (-2.8393, -3.9) -> (2.8393, -3.9)
  line L4 (2.8393, -3.9) -> (5.5, -6.5607)
  line L5 (5.5, -6.5607) -> (5.5, -8.2)
  line L6 (5.5, -8.2) -> (3.2628, -8.2)
  arc A2 (3.2628, -8.2) -> (3.1214, -8.5414) centre (3.2628, -8.4) ccw
  line L7 (3.1214, -8.5414) -> (4.2336, -9.6536)
  arc A3 (4.2336, -9.6536) -> (4.8314, -10) centre (4.8837, -9.2207) ccw
  line L8 (4.8314, -10) -> (9.5, -10)
  arc A4 (9.5, -10) -> (10, -9.5) centre (9.5, -9.5) ccw
  line L9 (10, -9.5) -> (10, -4.8314)
  arc A5 (10, -4.8314) -> (9.8222, -4.4022) centre (9.3929, -4.8314) ccw
  line L10 (9.8222, -4.4022) -> (8.5414, -3.1214)
  arc A6 (8.5414, -3.1214) -> (8.2, -3.2628) centre (8.4, -3.2628) ccw
  line L11 (8.2, -3.2628) -> (8.2, -5.5)
  line L12 (8.2, -5.5) -> (6.5607, -5.5)
  line L13 (6.5607, -5.5) -> (3.9, -2.8393)
  line L14 (3.9, -2.8393) -> (3.9, 2.8393)
  line L15 (3.9, 2.8393) -> (6.5607, 5.5)
  line L16 (6.5607, 5.5) -> (8.2, 5.5)
  line L17 (8.2, 5.5) -> (8.2, 3.2628)
  arc A7 (8.2, 3.2628) -> (8.5414, 3.1214) centre (8.4, 3.2628) ccw
  line L18 (8.5414, 3.1214) -> (9.8222, 4.4022)
  arc A8 (9.8222, 4.4022) -> (10, 4.8314) centre (9.3929, 4.8314) ccw
  line L19 (10, 4.8314) -> (10, 9.5)
  arc A9 (10, 9.5) -> (9.5, 10) centre (9.5, 9.5) ccw
  line L20 (9.5, 10) -> (4.8314, 10)
  arc A10 (4.8314, 10) -> (4.4022, 9.8222) centre (4.8314, 9.3929) ccw
  line L21 (4.4022, 9.8222) -> (3.1214, 8.5414)
  arc A11 (3.1214, 8.5414) -> (3.2628, 8.2) centre (3.2628, 8.4) ccw
  line L22 (3.2628, 8.2) -> (5.5, 8.2)
  line L23 (5.5, 8.2) -> (5.5, 6.5607)
  line L24 (5.5, 6.5607) -> (2.8393, 3.9)
  line L25 (2.8393, 3.9) -> (-2.8393, 3.9)
  line L26 (-2.8393, 3.9) -> (-5.5, 6.5607)
  line L27 (-5.5, 6.5607) -> (-5.5, 8.2)
  line L28 (-5.5, 8.2) -> (-3.2628, 8.2)
  arc A12 (-3.2628, 8.2) -> (-3.1214, 8.5414) centre (-3.2628, 8.4) ccw
  line L29 (-3.1214, 8.5414) -> (-4.4312, 9.8494)
  arc A13 (-4.4312, 9.8494) -> (-4.8314, 10) centre (-4.8314, 9.3929) ccw
  line L30 (-4.8314, 10) -> (-9.5, 10)
  arc A14 (-9.5, 10) -> (-10, 9.5) centre (-9.5, 9.5) ccw
  line L31 (-10, 9.5) -> (-10, 4.9)
  arc A15 (-10, 4.9) -> (-9.8494, 4.4312) centre (-9.3734, 4.8428) ccw
  line L32 (-9.8494, 4.4312) -> (-8.5414, 3.1214)
  arc A16 (-8.5414, 3.1214) -> (-8.2, 3.2628) centre (-8.4, 3.2628) ccw
  line L33 (-8.2, 3.2628) -> (-8.2, 5.5)
  line L34 (-8.2, 5.5) -> (-6.5607, 5.5)
  line L35 (-6.5607, 5.5) -> (-3.9, 2.8393)
  line L36 (-3.9, 2.8393) -> (-3.9, -2.8393)
  line L37 (-3.9, -2.8393) -> (-6.5607, -5.5)
  line L38 (-6.5607, -5.5) -> (-8.2, -5.5)
  line L39 (-8.2, -5.5) -> (-8.2, -3.2628)
  arc A17 (-8.2, -3.2628) -> (-8.5414, -3.1214) centre (-8.4, -3.2628) ccw
  line L40 (-8.5414, -3.1214) -> (-9.8222, -4.4022)
  arc A18 (-9.8222, -4.4022) -> (-9.9987, -4.7917) centre (-9.3929, -4.8314) ccw
  line L41 (-9.9987, -4.7917) -> (-10, -9.5)
  arc A19 (-10, -9.5) -> (-9.5, -10) centre (-9.5, -9.5) ccw
  line L42 (-9.5, -10) -> (-4.8314, -10)
  arc A20 (-4.8314, -10) -> (-4.4022, -9.8222) centre (-4.8314, -9.3929) ccw
  line L43 (-4.4022, -9.8222) -> (-3.1214, -8.5414)
  line L44 (-5.8557, 10) -> (6.4454, 10) construction
